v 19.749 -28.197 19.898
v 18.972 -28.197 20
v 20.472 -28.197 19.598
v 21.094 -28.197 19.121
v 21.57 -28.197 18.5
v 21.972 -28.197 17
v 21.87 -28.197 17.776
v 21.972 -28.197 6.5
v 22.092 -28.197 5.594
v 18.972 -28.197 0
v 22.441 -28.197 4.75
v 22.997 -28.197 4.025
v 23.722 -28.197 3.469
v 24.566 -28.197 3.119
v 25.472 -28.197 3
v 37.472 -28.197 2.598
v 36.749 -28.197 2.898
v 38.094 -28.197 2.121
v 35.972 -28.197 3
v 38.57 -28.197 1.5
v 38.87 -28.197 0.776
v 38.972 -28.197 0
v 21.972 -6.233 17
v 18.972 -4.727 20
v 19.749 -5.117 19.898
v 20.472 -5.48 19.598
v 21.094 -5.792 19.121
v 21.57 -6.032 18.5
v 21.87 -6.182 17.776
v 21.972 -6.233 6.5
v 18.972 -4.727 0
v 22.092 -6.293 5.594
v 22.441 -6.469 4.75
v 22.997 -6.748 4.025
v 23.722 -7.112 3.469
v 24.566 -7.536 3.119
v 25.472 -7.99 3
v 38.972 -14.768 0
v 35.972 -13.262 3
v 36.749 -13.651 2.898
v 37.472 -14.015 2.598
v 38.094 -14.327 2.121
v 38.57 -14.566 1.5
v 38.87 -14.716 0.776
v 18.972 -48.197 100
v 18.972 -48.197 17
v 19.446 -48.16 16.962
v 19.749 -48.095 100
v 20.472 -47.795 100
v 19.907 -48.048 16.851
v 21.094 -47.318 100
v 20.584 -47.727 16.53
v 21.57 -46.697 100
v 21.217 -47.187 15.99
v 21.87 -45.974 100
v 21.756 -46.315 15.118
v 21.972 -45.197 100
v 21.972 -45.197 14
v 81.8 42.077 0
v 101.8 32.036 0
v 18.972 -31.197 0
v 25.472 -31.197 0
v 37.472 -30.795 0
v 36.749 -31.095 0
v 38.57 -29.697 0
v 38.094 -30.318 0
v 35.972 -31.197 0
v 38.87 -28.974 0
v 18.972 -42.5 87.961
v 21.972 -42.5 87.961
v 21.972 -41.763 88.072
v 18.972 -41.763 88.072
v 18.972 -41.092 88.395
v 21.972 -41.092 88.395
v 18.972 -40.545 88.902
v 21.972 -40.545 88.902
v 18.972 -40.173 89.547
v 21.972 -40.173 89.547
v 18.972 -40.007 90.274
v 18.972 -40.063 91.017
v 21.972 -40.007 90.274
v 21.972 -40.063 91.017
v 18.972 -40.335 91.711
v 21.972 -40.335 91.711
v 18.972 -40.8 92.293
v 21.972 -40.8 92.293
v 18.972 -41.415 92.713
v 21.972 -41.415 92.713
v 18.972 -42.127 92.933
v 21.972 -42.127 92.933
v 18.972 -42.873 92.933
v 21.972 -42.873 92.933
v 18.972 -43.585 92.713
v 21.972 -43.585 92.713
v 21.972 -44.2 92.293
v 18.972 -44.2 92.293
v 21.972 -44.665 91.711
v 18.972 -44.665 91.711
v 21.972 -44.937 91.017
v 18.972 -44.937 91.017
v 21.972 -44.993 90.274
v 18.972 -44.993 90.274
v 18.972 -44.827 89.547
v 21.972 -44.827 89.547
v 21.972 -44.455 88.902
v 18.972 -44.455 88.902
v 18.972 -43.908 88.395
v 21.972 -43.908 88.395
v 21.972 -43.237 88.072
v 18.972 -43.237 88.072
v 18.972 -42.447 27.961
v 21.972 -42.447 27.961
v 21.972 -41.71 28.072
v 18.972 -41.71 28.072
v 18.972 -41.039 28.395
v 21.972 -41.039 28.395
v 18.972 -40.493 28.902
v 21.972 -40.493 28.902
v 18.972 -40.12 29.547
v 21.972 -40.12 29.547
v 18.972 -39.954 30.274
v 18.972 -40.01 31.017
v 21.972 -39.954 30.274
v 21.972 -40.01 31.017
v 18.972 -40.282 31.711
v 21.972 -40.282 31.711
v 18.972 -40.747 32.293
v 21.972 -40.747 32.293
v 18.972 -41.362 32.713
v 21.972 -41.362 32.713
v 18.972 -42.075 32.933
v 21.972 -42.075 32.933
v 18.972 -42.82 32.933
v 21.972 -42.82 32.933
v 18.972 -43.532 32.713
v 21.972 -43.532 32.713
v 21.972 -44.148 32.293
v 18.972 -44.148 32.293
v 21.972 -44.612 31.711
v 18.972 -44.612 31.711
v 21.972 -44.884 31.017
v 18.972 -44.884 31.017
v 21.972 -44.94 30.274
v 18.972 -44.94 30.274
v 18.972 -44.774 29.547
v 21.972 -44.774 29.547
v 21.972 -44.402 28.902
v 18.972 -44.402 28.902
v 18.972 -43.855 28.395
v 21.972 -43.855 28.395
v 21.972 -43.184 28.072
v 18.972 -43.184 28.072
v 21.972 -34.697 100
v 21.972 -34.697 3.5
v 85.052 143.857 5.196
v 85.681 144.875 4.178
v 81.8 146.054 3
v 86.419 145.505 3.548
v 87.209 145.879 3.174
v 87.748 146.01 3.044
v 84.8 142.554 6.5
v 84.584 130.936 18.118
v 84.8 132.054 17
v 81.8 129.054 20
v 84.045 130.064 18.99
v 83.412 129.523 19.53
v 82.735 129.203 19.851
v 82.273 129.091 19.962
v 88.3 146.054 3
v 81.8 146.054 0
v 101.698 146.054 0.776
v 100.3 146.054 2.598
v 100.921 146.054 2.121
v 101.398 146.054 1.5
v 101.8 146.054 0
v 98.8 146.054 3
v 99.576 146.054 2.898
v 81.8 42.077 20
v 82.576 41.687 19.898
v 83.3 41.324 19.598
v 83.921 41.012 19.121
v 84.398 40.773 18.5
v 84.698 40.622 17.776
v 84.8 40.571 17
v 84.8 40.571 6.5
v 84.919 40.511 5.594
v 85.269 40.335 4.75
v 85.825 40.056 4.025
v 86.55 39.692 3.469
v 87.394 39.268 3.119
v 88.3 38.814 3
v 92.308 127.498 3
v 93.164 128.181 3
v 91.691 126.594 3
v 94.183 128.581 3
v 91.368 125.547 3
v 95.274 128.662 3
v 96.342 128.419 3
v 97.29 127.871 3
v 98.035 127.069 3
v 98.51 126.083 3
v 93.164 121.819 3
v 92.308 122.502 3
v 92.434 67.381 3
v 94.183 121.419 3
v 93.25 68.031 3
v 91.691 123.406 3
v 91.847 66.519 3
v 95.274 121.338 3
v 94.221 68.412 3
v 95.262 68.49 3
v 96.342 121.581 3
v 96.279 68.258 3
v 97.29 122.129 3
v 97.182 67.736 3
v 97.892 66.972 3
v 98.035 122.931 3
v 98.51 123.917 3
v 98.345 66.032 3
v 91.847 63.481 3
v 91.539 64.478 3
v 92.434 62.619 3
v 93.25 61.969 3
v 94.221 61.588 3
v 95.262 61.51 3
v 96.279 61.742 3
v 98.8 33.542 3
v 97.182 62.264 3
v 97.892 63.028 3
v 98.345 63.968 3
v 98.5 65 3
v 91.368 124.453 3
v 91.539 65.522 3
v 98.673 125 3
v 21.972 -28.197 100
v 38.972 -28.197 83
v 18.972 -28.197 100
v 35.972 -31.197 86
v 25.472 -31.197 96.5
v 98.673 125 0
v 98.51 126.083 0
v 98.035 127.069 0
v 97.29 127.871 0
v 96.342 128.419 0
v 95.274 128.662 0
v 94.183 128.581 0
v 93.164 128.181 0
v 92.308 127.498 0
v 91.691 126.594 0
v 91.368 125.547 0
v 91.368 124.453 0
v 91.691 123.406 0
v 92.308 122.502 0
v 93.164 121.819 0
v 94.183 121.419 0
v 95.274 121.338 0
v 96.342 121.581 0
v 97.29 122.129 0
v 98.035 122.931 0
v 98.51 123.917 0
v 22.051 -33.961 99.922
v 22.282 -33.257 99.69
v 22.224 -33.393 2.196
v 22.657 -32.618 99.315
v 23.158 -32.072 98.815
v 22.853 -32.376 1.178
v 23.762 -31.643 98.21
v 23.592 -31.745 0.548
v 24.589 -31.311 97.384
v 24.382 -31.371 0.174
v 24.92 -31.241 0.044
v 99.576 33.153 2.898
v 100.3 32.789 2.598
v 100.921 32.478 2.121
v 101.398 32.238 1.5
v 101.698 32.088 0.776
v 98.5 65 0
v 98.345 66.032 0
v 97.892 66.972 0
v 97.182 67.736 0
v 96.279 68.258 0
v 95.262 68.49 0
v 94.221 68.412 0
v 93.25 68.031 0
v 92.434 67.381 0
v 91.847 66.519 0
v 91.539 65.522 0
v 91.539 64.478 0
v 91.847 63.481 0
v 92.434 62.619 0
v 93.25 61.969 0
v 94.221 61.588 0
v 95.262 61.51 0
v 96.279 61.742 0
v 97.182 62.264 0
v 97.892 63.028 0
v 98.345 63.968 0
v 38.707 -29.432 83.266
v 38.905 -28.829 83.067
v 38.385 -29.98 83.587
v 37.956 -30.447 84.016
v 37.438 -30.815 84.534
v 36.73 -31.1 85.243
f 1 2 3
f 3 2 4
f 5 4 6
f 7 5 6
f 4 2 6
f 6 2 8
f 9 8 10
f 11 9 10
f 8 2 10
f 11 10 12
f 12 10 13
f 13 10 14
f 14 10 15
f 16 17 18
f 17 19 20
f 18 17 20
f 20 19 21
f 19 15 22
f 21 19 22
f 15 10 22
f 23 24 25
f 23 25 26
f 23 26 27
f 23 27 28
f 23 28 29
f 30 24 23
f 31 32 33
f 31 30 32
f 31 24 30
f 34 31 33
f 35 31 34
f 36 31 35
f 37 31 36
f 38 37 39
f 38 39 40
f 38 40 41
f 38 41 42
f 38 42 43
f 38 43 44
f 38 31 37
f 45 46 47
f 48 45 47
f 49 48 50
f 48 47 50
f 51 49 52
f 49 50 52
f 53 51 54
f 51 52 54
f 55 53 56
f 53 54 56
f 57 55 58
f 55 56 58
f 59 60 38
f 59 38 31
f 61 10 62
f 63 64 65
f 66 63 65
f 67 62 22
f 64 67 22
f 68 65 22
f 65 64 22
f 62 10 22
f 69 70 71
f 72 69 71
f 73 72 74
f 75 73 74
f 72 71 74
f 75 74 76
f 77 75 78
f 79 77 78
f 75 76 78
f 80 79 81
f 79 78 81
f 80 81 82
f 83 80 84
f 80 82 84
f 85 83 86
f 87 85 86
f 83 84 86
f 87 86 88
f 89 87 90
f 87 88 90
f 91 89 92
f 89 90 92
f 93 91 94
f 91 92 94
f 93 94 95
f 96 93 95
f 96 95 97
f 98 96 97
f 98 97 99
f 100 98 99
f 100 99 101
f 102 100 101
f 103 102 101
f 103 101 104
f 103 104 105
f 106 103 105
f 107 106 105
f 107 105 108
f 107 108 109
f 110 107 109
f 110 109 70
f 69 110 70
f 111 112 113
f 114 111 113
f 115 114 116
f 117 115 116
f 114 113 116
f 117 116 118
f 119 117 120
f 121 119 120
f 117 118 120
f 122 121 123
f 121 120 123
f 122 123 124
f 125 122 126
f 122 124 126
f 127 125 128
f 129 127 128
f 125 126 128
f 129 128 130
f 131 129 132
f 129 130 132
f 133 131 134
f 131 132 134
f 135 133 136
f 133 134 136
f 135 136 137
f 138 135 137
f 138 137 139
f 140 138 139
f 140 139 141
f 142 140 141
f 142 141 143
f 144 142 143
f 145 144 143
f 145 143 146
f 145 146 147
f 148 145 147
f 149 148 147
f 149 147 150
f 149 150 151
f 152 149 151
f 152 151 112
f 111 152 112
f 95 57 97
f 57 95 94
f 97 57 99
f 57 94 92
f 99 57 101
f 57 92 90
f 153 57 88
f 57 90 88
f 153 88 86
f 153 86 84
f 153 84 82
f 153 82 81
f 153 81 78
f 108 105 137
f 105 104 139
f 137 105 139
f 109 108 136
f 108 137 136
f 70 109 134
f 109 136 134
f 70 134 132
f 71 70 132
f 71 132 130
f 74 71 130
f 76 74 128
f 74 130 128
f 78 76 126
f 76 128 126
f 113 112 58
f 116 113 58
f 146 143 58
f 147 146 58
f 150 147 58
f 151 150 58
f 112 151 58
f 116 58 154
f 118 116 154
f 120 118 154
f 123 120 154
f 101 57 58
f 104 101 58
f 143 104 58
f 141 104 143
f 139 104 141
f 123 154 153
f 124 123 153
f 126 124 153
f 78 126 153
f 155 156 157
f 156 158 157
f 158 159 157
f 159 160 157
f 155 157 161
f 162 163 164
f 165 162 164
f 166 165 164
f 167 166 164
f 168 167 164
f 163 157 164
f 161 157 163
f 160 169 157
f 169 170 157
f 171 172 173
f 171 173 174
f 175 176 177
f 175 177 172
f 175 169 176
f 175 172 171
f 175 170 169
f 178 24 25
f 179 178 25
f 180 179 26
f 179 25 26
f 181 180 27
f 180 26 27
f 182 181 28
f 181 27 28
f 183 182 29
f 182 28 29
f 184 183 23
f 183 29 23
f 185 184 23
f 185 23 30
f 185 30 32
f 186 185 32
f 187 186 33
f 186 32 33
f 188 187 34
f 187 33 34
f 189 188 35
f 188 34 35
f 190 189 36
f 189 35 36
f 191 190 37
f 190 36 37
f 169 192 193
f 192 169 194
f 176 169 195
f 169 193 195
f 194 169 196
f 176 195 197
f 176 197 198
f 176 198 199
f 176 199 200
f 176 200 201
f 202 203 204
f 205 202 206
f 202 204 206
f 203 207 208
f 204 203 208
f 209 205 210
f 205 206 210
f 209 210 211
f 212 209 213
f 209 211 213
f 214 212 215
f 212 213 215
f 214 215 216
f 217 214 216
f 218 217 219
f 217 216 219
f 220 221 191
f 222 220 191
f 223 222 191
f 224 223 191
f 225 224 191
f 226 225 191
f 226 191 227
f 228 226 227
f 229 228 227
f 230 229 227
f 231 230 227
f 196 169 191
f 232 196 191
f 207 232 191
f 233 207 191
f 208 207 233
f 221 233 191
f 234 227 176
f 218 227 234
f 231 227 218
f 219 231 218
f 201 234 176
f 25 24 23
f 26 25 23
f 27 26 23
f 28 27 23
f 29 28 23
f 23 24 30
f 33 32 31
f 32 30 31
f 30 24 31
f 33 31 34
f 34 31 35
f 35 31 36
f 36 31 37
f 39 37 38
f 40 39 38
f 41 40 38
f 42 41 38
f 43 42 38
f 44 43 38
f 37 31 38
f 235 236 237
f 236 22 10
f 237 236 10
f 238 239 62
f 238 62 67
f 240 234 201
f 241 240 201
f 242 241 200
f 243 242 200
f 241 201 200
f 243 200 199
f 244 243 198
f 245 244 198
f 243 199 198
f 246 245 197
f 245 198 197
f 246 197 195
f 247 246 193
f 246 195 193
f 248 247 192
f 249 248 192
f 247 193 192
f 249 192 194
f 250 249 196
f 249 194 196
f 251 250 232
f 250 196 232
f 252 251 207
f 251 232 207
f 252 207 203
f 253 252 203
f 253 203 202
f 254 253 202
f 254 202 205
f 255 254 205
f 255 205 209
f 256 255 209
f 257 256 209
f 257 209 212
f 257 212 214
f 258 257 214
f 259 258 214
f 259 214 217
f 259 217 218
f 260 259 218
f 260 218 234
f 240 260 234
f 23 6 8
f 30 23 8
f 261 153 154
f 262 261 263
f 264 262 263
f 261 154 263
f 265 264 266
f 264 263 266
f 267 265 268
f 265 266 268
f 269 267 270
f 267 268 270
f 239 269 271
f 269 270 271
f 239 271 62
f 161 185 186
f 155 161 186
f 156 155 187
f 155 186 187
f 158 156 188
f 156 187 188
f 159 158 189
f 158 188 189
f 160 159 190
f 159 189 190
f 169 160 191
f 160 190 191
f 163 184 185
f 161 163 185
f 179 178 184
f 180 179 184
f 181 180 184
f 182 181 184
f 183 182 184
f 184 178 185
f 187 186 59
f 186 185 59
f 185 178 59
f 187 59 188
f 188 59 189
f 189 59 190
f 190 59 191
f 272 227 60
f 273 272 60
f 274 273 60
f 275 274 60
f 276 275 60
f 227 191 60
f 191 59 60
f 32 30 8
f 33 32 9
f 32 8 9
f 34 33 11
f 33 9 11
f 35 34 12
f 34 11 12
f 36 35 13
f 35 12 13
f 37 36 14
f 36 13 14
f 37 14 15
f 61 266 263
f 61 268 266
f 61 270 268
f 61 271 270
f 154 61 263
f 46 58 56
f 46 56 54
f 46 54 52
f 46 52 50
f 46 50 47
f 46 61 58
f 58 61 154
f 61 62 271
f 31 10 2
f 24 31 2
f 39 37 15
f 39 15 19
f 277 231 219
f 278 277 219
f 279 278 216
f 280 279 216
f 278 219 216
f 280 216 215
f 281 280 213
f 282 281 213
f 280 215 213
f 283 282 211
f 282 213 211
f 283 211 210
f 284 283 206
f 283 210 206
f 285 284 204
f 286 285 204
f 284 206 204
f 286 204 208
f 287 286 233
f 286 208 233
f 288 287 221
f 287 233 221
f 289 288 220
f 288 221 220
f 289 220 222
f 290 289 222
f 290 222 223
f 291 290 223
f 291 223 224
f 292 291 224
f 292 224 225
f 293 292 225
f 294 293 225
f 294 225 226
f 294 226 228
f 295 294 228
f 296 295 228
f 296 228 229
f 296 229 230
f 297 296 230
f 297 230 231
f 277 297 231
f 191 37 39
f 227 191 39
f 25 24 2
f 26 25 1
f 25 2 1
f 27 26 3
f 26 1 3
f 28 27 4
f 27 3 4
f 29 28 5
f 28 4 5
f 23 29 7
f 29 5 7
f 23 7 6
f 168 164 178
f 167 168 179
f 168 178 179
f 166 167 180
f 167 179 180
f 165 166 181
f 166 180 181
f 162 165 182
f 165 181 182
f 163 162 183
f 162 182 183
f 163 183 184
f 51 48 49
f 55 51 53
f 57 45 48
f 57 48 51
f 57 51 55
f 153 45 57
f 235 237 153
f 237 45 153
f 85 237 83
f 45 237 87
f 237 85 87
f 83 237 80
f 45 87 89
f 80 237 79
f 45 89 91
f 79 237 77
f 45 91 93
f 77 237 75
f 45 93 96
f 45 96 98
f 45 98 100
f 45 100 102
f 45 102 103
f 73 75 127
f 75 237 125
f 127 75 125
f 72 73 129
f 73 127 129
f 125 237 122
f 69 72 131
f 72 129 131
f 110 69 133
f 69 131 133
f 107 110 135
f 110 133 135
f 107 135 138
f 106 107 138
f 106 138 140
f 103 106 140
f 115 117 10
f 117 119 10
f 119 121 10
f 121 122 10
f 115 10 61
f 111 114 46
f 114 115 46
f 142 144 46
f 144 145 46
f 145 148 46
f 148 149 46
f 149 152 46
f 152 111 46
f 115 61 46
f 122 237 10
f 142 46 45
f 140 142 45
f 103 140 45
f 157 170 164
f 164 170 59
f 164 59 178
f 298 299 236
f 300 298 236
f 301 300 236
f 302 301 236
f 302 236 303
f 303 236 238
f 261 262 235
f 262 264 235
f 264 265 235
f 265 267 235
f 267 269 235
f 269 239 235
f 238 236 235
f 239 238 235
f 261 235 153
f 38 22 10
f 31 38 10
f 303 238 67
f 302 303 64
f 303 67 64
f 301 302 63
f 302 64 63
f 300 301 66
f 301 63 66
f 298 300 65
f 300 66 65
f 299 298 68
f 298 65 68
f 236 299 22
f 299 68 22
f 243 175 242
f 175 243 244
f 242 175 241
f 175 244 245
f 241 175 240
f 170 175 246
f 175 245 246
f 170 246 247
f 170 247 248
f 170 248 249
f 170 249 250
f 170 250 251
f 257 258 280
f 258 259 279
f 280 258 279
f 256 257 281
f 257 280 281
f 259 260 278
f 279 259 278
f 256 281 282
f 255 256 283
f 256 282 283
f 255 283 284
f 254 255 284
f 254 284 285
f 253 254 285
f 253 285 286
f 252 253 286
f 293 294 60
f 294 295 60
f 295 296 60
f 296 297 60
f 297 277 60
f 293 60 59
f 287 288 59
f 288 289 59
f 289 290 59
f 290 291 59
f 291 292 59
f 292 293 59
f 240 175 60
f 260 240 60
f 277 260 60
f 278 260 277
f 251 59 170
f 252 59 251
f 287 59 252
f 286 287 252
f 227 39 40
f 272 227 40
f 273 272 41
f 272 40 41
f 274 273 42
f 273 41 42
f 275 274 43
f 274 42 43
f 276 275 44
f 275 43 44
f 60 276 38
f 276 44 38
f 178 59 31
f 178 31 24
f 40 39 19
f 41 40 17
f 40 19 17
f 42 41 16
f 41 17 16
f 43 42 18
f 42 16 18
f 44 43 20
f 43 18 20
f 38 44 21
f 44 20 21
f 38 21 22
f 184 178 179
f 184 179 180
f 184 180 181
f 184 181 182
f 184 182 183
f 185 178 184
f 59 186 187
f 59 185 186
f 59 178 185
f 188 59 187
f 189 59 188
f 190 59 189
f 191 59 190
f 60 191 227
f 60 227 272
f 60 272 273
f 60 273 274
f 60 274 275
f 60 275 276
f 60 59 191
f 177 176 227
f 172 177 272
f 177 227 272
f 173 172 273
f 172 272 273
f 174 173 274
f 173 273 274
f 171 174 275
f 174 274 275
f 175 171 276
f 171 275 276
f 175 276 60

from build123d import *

# Parameters (mm, degrees)
L_START                              = 32.036415807
L_ANGLE_EQUAL_20X20X3_2_DEPTH        = 114.017108684
L_START_2                            = 64
L_ANGLE_EQUAL_20X20X3_2_2_OUTLINE_W  = 25
L_ANGLE_EQUAL_20X20X3_2_2_OUTLINE_H  = 24
L_ANGLE_EQUAL_20X20X3_2_2_DEPTH      = 10.304509974
L_START_3                            = 22.430930733
L_ANGLE_EQUAL_20X20X3_2_3_DEPTH      = 68.304556748
L_START_4                            = 12.390487258
L_ANGLE_EQUAL_20X20X3_2_4_DEPTH      = 88.385443698
L_START_5                            = -6
L_ANGLE_EQUAL_20X20X3_2_5_OUTLINE_W  = 60
L_ANGLE_EQUAL_20X20X3_2_5_OUTLINE_H  = 21
L_ANGLE_EQUAL_20X20X3_2_5_DEPTH      = 10.287337797
L_START_6                            = 74.304509974
L_ANGLE_EQUAL_20X20X3_2_6_OUTLINE_W  = 60
L_ANGLE_EQUAL_20X20X3_2_6_OUTLINE_H  = 21
L_ANGLE_EQUAL_20X20X3_2_6_DEPTH      = 9.695490026
L_START_7                            = -45.197160902
L_ANGLE_EQUAL_20X20X3_2_7_DEPTH      = 17
L_START_8                            = 1.242640687
L_ANGLE_EQUAL_20X20X3_2_8_DEPTH      = 98.757359313
L_START_9                            = 18.242640687
L_ANGLE_EQUAL_20X20X3_2_9_DEPTH      = 81.757359313
L_START_10                           = -49
L_ANGLE_EQUAL_20X20X3_2_10_DEPTH     = 22
L_START_11                           = -48.197160902
L_ANGLE_EQUAL_20X20X3_2_11_DEPTH     = 33.429444614
L_START_12                           = -14.767716288
L_ANGLE_EQUAL_20X20X3_2_12_DEPTH     = 10.040443476
L_START_13                           = 4.287337797
L_ANGLE_EQUAL_20X20X3_2_13_OUTLINE_W = 25
L_ANGLE_EQUAL_20X20X3_2_13_OUTLINE_H = 22
L_ANGLE_EQUAL_20X20X3_2_13_DEPTH     = 8.973175794
ESBO_O2_R                            = 3.5
ESBO_O2_R_2                          = 3.672679552
CORTE_EXTRUS_O1_DEPTH                = 200
ESBO_O3_R                            = 2.5
CORTE_EXTRUS_O2_DEPTH                = 10
CORTE_EXTRUS_O3_DEPTH                = 10
CORTE_EXTRUS_O4_DEPTH                = 10
CORTE_EXTRUS_O5_DEPTH                = 10
APARAR_ESTENDER4_START               = -48.197160902
APARAR_ESTENDER4_DEPTH               = 20
APARAR_ESTENDER4_2_DEPTH             = 20.621320344
CORTE_EXTRUS_O6_DEPTH                = 10


with BuildPart() as part:
    # L angle (equal) 20X20X3(2): read off the stored shape, not the designer's step
    # L angle (equal) 20X20X3(2) outline → L angle (equal) 20X20X3(2) (new body)
    with BuildSketch(Plane(origin=(0, 0, 0), x_dir=(1, 0, 0), z_dir=(0, 1, 0)).offset(L_START)):
        with BuildLine():
            Line((101.8, 0), (81.8, 0))
            Line((81.8, 0), (81.8, -20))
            ThreePointArc((81.8, -20), (83.921320344, -19.121320344), (84.8, -17))
            Line((84.8, -17), (84.8, -6.5))
            ThreePointArc((84.8, -6.5), (85.825126266, -4.025126266), (88.3, -3))
            Line((88.3, -3), (98.8, -3))
            ThreePointArc((98.8, -3), (100.921320344, -2.121320344), (101.8, 0))
        make_face()
    extrude(amount=L_ANGLE_EQUAL_20X20X3_2_DEPTH)

    # L angle _equal_ 20X20X3_2 2 outline → L angle _equal_ 20X20X3_2 2 (cut)
    with BuildSketch(Plane(origin=(0, 0, 0), x_dir=(0.8937031332908548, -0.4486587896677259, 0), z_dir=(0.4486587896677259, 0.8937031332908548, 0)).offset(L_START_2)):
        with Locations((65.5, -10)):
            Rectangle(L_ANGLE_EQUAL_20X20X3_2_2_OUTLINE_W, L_ANGLE_EQUAL_20X20X3_2_2_OUTLINE_H)
    extrude(amount=L_ANGLE_EQUAL_20X20X3_2_2_DEPTH, mode=Mode.SUBTRACT)

    # Esboço2 → Corte-extrusão1 (cut)
    with BuildSketch(Plane.XY.offset(3)):
        with Locations((95, 65)):
            Circle(ESBO_O2_R)
        with Locations((95, 125)):
            Circle(ESBO_O2_R_2)
    extrude(amount=-CORTE_EXTRUS_O1_DEPTH, mode=Mode.SUBTRACT)

    # Esboço5 → Corte-extrusão4 (cut)
    with BuildSketch(Plane.ZY.offset(-81.8)):
        Polygon((3, 146.053524491), (20, 129.053524491), (20, 146.053524491), align=None)
    extrude(amount=-CORTE_EXTRUS_O4_DEPTH, mode=Mode.SUBTRACT)


with BuildPart() as body_2:
    # L angle _equal_ 20X20X3_2 3 outline → L angle _equal_ 20X20X3_2 3 (new body)
    with BuildSketch(Plane(origin=(0, 0, 0), x_dir=(0.5974105809077824, -0.8019355322090584, 0), z_dir=(0.8019355322090584, 0.5974105809077825, 0)).offset(L_START_3)):
        with BuildLine():
            Line((35.125256976, 0), (15.125256976, 0))
            Line((15.125256976, 0), (15.125256976, -20))
            ThreePointArc((15.125256976, -20), (17.24657732, -19.121320344), (18.125256976, -17))
            Line((18.125256976, -17), (18.125256976, -6.5))
            ThreePointArc((18.125256976, -6.5), (19.150383242, -4.025126266), (21.625256976, -3))
            Line((21.625256976, -3), (32.125256976, -3))
            ThreePointArc((32.125256976, -3), (34.24657732, -2.121320344), (35.125256976, 0))
        make_face()
    extrude(amount=L_ANGLE_EQUAL_20X20X3_2_3_DEPTH)

    # L angle _equal_ 20X20X3_2 4 outline → L angle _equal_ 20X20X3_2 4 (add)
    with BuildSketch(Plane(origin=(0, 0, 0), x_dir=(0.5974105809077824, -0.8019355322090584, 0), z_dir=(0.8019355322090584, 0.5974105809077825, 0)).offset(L_START_4)):
        with BuildLine():
            Line((35.125256976, 0), (15.125256976, 0))
            Line((15.125256976, 0), (15.125256976, -20))
            ThreePointArc((15.125256976, -20), (17.24657732, -19.121320344), (18.125256976, -17))
            Line((18.125256976, -17), (18.125256976, -6.5))
            ThreePointArc((18.125256976, -6.5), (19.150383242, -4.025126266), (21.625256976, -3))
            Line((21.625256976, -3), (32.125256976, -3))
            ThreePointArc((32.125256976, -3), (34.24657732, -2.121320344), (35.125256976, 0))
        make_face()
    extrude(amount=L_ANGLE_EQUAL_20X20X3_2_4_DEPTH)

    # L angle _equal_ 20X20X3_2 5 outline → L angle _equal_ 20X20X3_2 5 (cut)
    with BuildSketch(Plane(origin=(0, 0, 0), x_dir=(0.8937031332908548, -0.4486587896677259, 0), z_dir=(0.4486587896677259, 0.8937031332908548, 0)).offset(L_START_5)):
        with Locations((48, -10.5)):
            Rectangle(L_ANGLE_EQUAL_20X20X3_2_5_OUTLINE_W, L_ANGLE_EQUAL_20X20X3_2_5_OUTLINE_H)
    extrude(amount=L_ANGLE_EQUAL_20X20X3_2_5_DEPTH, mode=Mode.SUBTRACT)

    # L angle _equal_ 20X20X3_2 6 outline → L angle _equal_ 20X20X3_2 6 (cut)
    with BuildSketch(Plane(origin=(0, 0, 0), x_dir=(0.8937031332908548, -0.4486587896677259, 0), z_dir=(0.4486587896677259, 0.8937031332908548, 0)).offset(L_START_6)):
        with Locations((48, -10.5)):
            Rectangle(L_ANGLE_EQUAL_20X20X3_2_6_OUTLINE_W, L_ANGLE_EQUAL_20X20X3_2_6_OUTLINE_H)
    extrude(amount=L_ANGLE_EQUAL_20X20X3_2_6_DEPTH, mode=Mode.SUBTRACT)


with BuildPart() as body_3:
    # L angle _equal_ 20X20X3_2 7 outline → L angle _equal_ 20X20X3_2 7 (new body)
    with BuildSketch(Plane(origin=(0, 0, 0), x_dir=(1, 0, 0), z_dir=(0, 1, 0)).offset(L_START_7)):
        Polygon((19.593680894, -20.621320344), (18.97236055, -20), (18.97236055, -100), (21.97236055, -100), (21.97236055, -18.242640687), align=None)
    extrude(amount=L_ANGLE_EQUAL_20X20X3_2_7_DEPTH)

    # L angle _equal_ 20X20X3_2 8 outline → L angle _equal_ 20X20X3_2 8 (add)
    with BuildSketch(Plane.XY.offset(L_START_8)):
        with BuildLine():
            ThreePointArc((21.97236055, -34.697160902), (22.997486816, -32.222287168), (25.47236055, -31.197160902))
            Line((25.47236055, -31.197160902), (35.97236055, -31.197160902))
            ThreePointArc((35.97236055, -31.197160902), (38.093680894, -30.318481246), (38.97236055, -28.197160902))
            Line((38.97236055, -28.197160902), (21.97236055, -28.197160902))
            Line((21.97236055, -28.197160902), (21.97236055, -34.697160902))
        make_face()
    extrude(amount=L_ANGLE_EQUAL_20X20X3_2_8_DEPTH)

    # L angle _equal_ 20X20X3_2 9 outline → L angle _equal_ 20X20X3_2 9 (add)
    with BuildSketch(Plane.XY.offset(L_START_9)):
        with BuildLine():
            ThreePointArc((18.97236055, -48.197160902), (21.093680894, -47.318481246), (21.97236055, -45.197160902))
            Line((21.97236055, -45.197160902), (18.97236055, -45.197160902))
            Line((18.97236055, -45.197160902), (18.97236055, -48.197160902))
        make_face()
    extrude(amount=L_ANGLE_EQUAL_20X20X3_2_9_DEPTH)

    # L angle _equal_ 20X20X3_2 10 outline → L angle _equal_ 20X20X3_2 10 (cut)
    with BuildSketch(Plane(origin=(0, 0, 0), x_dir=(1, 0, 0), z_dir=(0, 1, 0)).offset(L_START_10)):
        Polygon((35.97236055, -3), (36.593680894, -3.621320344), (38.97236055, -1.242640687), (21.97236055, -1.242640687), (21.97236055, -6.5), (25.47236055, -3), align=None)
        Polygon((19.593680894, -20.621320344), (21.97236055, -18.242640687), (18.97236055, -18.242640687), (18.97236055, -20), align=None)
        Polygon((22.593680894, -17.621320344), (21.97236055, -17), (21.97236055, -18.242640687), align=None)
    extrude(amount=L_ANGLE_EQUAL_20X20X3_2_10_DEPTH, mode=Mode.SUBTRACT)

    # Esboço3 → Corte-extrusão2 (cut)
    with BuildSketch(Plane(origin=(21.97236055, 0, 0), x_dir=(0, 0, -1), z_dir=(1, 0, 0))):
        with Locations((-90.460528522, -42.5)):
            Circle(ESBO_O3_R)
        with Locations((-30.460551783, -42.447167301)):
            Circle(ESBO_O3_R)
    extrude(amount=-CORTE_EXTRUS_O2_DEPTH, mode=Mode.SUBTRACT)

    # Esboço6 → Corte-extrusão5 (cut)
    with BuildSketch(Plane(origin=(0, -28.197160902, 0), x_dir=(1, 0, 0), z_dir=(0, 1, 0))):
        Polygon((21.97236055, -100), (38.97236055, -100), (38.97236055, -83), align=None)
    extrude(amount=-CORTE_EXTRUS_O5_DEPTH, mode=Mode.SUBTRACT)

    # Aparar_Estender4 2 outline → Aparar_Estender4 2 (add)
    with BuildSketch(Plane.XY):
        with BuildLine():
            ThreePointArc((35.97236055, -31.197160902), (38.093680894, -30.318481246), (38.97236055, -28.197160902))
            Line((38.97236055, -28.197160902), (18.97236055, -28.197160902))
            Line((18.97236055, -28.197160902), (18.97236055, -48.197160902))
            ThreePointArc((18.97236055, -48.197160902), (21.093680894, -47.318481246), (21.97236055, -45.197160902))
            Line((21.97236055, -45.197160902), (21.97236055, -34.697160902))
            ThreePointArc((21.97236055, -34.697160902), (22.997486816, -32.222287168), (25.47236055, -31.197160902))
            Line((25.47236055, -31.197160902), (35.97236055, -31.197160902))
        make_face()
    extrude(amount=APARAR_ESTENDER4_2_DEPTH)

    # Esboço7 → Corte-extrusão6 (cut)
    with BuildSketch(Plane.ZY.offset(-18.97236055)):
        Polygon((0, -31.197160902), (17, -48.197160902), (0, -48.197160902), align=None)
    extrude(amount=-CORTE_EXTRUS_O6_DEPTH, mode=Mode.SUBTRACT)


with BuildPart() as body_4:
    # L angle _equal_ 20X20X3_2 11 outline → L angle _equal_ 20X20X3_2 11 (new body)
    with BuildSketch(Plane(origin=(0, 0, 0), x_dir=(1, 0, 0), z_dir=(0, 1, 0)).offset(L_START_11)):
        with BuildLine():
            Line((38.97236055, 0), (18.97236055, 0))
            Line((18.97236055, 0), (18.97236055, -20))
            ThreePointArc((18.97236055, -20), (21.093680894, -19.121320344), (21.97236055, -17))
            Line((21.97236055, -17), (21.97236055, -6.5))
            ThreePointArc((21.97236055, -6.5), (22.997486816, -4.025126266), (25.47236055, -3))
            Line((25.47236055, -3), (35.97236055, -3))
            ThreePointArc((35.97236055, -3), (38.093680894, -2.121320344), (38.97236055, 0))
        make_face()
    extrude(amount=L_ANGLE_EQUAL_20X20X3_2_11_DEPTH)

    # L angle _equal_ 20X20X3_2 12 outline → L angle _equal_ 20X20X3_2 12 (add)
    with BuildSketch(Plane(origin=(0, 0, 0), x_dir=(1, 0, 0), z_dir=(0, 1, 0)).offset(L_START_12)):
        with BuildLine():
            Line((38.97236055, 0), (18.97236055, 0))
            Line((18.97236055, 0), (18.97236055, -20))
            ThreePointArc((18.97236055, -20), (21.093680894, -19.121320344), (21.97236055, -17))
            Line((21.97236055, -17), (21.97236055, -6.5))
            ThreePointArc((21.97236055, -6.5), (22.997486816, -4.025126266), (25.47236055, -3))
            Line((25.47236055, -3), (35.97236055, -3))
            ThreePointArc((35.97236055, -3), (38.093680894, -2.121320344), (38.97236055, 0))
        make_face()
    extrude(amount=L_ANGLE_EQUAL_20X20X3_2_12_DEPTH)

    # L angle _equal_ 20X20X3_2 13 outline → L angle _equal_ 20X20X3_2 13 (cut)
    with BuildSketch(Plane(origin=(0, 0, 0), x_dir=(0.8937031332908548, -0.4486587896677259, 0), z_dir=(0.4486587896677259, 0.8937031332908548, 0)).offset(L_START_13)):
        with Locations((30.5, -11)):
            Rectangle(L_ANGLE_EQUAL_20X20X3_2_13_OUTLINE_W, L_ANGLE_EQUAL_20X20X3_2_13_OUTLINE_H)
    extrude(amount=L_ANGLE_EQUAL_20X20X3_2_13_DEPTH, mode=Mode.SUBTRACT)

    # Esboço4 → Corte-extrusão3 (cut)
    with BuildSketch(Plane(origin=(0, 0, 0), x_dir=(-1, 0, 0), z_dir=(0, 0, -1))):
        Polygon((-21.97236055, -48.197160902), (-38.97236055, -31.197160902), (-38.97236055, -48.197160902), align=None)
    extrude(amount=-CORTE_EXTRUS_O3_DEPTH, mode=Mode.SUBTRACT)

    # Aparar/Estender4: read off the stored shape, not the designer's step
    # Aparar/Estender4 outline → Aparar/Estender4 (cut)
    with BuildSketch(Plane(origin=(0, 0, 0), x_dir=(1, 0, 0), z_dir=(0, 1, 0)).offset(APARAR_ESTENDER4_START)):
        with BuildLine():
            Line((38.97236055, 0), (18.97236055, 0))
            Line((18.97236055, 0), (18.97236055, -20))
            ThreePointArc((18.97236055, -20), (21.093680894, -19.121320344), (21.97236055, -17))
            Line((21.97236055, -17), (21.97236055, -6.5))
            ThreePointArc((21.97236055, -6.5), (22.997486816, -4.025126266), (25.47236055, -3))
            Line((25.47236055, -3), (35.97236055, -3))
            ThreePointArc((35.97236055, -3), (38.093680894, -2.121320344), (38.97236055, 0))
        make_face()
    extrude(amount=APARAR_ESTENDER4_DEPTH, mode=Mode.SUBTRACT)


solid = Compound([part.part, body_2.part, body_3.part, body_4.part])
